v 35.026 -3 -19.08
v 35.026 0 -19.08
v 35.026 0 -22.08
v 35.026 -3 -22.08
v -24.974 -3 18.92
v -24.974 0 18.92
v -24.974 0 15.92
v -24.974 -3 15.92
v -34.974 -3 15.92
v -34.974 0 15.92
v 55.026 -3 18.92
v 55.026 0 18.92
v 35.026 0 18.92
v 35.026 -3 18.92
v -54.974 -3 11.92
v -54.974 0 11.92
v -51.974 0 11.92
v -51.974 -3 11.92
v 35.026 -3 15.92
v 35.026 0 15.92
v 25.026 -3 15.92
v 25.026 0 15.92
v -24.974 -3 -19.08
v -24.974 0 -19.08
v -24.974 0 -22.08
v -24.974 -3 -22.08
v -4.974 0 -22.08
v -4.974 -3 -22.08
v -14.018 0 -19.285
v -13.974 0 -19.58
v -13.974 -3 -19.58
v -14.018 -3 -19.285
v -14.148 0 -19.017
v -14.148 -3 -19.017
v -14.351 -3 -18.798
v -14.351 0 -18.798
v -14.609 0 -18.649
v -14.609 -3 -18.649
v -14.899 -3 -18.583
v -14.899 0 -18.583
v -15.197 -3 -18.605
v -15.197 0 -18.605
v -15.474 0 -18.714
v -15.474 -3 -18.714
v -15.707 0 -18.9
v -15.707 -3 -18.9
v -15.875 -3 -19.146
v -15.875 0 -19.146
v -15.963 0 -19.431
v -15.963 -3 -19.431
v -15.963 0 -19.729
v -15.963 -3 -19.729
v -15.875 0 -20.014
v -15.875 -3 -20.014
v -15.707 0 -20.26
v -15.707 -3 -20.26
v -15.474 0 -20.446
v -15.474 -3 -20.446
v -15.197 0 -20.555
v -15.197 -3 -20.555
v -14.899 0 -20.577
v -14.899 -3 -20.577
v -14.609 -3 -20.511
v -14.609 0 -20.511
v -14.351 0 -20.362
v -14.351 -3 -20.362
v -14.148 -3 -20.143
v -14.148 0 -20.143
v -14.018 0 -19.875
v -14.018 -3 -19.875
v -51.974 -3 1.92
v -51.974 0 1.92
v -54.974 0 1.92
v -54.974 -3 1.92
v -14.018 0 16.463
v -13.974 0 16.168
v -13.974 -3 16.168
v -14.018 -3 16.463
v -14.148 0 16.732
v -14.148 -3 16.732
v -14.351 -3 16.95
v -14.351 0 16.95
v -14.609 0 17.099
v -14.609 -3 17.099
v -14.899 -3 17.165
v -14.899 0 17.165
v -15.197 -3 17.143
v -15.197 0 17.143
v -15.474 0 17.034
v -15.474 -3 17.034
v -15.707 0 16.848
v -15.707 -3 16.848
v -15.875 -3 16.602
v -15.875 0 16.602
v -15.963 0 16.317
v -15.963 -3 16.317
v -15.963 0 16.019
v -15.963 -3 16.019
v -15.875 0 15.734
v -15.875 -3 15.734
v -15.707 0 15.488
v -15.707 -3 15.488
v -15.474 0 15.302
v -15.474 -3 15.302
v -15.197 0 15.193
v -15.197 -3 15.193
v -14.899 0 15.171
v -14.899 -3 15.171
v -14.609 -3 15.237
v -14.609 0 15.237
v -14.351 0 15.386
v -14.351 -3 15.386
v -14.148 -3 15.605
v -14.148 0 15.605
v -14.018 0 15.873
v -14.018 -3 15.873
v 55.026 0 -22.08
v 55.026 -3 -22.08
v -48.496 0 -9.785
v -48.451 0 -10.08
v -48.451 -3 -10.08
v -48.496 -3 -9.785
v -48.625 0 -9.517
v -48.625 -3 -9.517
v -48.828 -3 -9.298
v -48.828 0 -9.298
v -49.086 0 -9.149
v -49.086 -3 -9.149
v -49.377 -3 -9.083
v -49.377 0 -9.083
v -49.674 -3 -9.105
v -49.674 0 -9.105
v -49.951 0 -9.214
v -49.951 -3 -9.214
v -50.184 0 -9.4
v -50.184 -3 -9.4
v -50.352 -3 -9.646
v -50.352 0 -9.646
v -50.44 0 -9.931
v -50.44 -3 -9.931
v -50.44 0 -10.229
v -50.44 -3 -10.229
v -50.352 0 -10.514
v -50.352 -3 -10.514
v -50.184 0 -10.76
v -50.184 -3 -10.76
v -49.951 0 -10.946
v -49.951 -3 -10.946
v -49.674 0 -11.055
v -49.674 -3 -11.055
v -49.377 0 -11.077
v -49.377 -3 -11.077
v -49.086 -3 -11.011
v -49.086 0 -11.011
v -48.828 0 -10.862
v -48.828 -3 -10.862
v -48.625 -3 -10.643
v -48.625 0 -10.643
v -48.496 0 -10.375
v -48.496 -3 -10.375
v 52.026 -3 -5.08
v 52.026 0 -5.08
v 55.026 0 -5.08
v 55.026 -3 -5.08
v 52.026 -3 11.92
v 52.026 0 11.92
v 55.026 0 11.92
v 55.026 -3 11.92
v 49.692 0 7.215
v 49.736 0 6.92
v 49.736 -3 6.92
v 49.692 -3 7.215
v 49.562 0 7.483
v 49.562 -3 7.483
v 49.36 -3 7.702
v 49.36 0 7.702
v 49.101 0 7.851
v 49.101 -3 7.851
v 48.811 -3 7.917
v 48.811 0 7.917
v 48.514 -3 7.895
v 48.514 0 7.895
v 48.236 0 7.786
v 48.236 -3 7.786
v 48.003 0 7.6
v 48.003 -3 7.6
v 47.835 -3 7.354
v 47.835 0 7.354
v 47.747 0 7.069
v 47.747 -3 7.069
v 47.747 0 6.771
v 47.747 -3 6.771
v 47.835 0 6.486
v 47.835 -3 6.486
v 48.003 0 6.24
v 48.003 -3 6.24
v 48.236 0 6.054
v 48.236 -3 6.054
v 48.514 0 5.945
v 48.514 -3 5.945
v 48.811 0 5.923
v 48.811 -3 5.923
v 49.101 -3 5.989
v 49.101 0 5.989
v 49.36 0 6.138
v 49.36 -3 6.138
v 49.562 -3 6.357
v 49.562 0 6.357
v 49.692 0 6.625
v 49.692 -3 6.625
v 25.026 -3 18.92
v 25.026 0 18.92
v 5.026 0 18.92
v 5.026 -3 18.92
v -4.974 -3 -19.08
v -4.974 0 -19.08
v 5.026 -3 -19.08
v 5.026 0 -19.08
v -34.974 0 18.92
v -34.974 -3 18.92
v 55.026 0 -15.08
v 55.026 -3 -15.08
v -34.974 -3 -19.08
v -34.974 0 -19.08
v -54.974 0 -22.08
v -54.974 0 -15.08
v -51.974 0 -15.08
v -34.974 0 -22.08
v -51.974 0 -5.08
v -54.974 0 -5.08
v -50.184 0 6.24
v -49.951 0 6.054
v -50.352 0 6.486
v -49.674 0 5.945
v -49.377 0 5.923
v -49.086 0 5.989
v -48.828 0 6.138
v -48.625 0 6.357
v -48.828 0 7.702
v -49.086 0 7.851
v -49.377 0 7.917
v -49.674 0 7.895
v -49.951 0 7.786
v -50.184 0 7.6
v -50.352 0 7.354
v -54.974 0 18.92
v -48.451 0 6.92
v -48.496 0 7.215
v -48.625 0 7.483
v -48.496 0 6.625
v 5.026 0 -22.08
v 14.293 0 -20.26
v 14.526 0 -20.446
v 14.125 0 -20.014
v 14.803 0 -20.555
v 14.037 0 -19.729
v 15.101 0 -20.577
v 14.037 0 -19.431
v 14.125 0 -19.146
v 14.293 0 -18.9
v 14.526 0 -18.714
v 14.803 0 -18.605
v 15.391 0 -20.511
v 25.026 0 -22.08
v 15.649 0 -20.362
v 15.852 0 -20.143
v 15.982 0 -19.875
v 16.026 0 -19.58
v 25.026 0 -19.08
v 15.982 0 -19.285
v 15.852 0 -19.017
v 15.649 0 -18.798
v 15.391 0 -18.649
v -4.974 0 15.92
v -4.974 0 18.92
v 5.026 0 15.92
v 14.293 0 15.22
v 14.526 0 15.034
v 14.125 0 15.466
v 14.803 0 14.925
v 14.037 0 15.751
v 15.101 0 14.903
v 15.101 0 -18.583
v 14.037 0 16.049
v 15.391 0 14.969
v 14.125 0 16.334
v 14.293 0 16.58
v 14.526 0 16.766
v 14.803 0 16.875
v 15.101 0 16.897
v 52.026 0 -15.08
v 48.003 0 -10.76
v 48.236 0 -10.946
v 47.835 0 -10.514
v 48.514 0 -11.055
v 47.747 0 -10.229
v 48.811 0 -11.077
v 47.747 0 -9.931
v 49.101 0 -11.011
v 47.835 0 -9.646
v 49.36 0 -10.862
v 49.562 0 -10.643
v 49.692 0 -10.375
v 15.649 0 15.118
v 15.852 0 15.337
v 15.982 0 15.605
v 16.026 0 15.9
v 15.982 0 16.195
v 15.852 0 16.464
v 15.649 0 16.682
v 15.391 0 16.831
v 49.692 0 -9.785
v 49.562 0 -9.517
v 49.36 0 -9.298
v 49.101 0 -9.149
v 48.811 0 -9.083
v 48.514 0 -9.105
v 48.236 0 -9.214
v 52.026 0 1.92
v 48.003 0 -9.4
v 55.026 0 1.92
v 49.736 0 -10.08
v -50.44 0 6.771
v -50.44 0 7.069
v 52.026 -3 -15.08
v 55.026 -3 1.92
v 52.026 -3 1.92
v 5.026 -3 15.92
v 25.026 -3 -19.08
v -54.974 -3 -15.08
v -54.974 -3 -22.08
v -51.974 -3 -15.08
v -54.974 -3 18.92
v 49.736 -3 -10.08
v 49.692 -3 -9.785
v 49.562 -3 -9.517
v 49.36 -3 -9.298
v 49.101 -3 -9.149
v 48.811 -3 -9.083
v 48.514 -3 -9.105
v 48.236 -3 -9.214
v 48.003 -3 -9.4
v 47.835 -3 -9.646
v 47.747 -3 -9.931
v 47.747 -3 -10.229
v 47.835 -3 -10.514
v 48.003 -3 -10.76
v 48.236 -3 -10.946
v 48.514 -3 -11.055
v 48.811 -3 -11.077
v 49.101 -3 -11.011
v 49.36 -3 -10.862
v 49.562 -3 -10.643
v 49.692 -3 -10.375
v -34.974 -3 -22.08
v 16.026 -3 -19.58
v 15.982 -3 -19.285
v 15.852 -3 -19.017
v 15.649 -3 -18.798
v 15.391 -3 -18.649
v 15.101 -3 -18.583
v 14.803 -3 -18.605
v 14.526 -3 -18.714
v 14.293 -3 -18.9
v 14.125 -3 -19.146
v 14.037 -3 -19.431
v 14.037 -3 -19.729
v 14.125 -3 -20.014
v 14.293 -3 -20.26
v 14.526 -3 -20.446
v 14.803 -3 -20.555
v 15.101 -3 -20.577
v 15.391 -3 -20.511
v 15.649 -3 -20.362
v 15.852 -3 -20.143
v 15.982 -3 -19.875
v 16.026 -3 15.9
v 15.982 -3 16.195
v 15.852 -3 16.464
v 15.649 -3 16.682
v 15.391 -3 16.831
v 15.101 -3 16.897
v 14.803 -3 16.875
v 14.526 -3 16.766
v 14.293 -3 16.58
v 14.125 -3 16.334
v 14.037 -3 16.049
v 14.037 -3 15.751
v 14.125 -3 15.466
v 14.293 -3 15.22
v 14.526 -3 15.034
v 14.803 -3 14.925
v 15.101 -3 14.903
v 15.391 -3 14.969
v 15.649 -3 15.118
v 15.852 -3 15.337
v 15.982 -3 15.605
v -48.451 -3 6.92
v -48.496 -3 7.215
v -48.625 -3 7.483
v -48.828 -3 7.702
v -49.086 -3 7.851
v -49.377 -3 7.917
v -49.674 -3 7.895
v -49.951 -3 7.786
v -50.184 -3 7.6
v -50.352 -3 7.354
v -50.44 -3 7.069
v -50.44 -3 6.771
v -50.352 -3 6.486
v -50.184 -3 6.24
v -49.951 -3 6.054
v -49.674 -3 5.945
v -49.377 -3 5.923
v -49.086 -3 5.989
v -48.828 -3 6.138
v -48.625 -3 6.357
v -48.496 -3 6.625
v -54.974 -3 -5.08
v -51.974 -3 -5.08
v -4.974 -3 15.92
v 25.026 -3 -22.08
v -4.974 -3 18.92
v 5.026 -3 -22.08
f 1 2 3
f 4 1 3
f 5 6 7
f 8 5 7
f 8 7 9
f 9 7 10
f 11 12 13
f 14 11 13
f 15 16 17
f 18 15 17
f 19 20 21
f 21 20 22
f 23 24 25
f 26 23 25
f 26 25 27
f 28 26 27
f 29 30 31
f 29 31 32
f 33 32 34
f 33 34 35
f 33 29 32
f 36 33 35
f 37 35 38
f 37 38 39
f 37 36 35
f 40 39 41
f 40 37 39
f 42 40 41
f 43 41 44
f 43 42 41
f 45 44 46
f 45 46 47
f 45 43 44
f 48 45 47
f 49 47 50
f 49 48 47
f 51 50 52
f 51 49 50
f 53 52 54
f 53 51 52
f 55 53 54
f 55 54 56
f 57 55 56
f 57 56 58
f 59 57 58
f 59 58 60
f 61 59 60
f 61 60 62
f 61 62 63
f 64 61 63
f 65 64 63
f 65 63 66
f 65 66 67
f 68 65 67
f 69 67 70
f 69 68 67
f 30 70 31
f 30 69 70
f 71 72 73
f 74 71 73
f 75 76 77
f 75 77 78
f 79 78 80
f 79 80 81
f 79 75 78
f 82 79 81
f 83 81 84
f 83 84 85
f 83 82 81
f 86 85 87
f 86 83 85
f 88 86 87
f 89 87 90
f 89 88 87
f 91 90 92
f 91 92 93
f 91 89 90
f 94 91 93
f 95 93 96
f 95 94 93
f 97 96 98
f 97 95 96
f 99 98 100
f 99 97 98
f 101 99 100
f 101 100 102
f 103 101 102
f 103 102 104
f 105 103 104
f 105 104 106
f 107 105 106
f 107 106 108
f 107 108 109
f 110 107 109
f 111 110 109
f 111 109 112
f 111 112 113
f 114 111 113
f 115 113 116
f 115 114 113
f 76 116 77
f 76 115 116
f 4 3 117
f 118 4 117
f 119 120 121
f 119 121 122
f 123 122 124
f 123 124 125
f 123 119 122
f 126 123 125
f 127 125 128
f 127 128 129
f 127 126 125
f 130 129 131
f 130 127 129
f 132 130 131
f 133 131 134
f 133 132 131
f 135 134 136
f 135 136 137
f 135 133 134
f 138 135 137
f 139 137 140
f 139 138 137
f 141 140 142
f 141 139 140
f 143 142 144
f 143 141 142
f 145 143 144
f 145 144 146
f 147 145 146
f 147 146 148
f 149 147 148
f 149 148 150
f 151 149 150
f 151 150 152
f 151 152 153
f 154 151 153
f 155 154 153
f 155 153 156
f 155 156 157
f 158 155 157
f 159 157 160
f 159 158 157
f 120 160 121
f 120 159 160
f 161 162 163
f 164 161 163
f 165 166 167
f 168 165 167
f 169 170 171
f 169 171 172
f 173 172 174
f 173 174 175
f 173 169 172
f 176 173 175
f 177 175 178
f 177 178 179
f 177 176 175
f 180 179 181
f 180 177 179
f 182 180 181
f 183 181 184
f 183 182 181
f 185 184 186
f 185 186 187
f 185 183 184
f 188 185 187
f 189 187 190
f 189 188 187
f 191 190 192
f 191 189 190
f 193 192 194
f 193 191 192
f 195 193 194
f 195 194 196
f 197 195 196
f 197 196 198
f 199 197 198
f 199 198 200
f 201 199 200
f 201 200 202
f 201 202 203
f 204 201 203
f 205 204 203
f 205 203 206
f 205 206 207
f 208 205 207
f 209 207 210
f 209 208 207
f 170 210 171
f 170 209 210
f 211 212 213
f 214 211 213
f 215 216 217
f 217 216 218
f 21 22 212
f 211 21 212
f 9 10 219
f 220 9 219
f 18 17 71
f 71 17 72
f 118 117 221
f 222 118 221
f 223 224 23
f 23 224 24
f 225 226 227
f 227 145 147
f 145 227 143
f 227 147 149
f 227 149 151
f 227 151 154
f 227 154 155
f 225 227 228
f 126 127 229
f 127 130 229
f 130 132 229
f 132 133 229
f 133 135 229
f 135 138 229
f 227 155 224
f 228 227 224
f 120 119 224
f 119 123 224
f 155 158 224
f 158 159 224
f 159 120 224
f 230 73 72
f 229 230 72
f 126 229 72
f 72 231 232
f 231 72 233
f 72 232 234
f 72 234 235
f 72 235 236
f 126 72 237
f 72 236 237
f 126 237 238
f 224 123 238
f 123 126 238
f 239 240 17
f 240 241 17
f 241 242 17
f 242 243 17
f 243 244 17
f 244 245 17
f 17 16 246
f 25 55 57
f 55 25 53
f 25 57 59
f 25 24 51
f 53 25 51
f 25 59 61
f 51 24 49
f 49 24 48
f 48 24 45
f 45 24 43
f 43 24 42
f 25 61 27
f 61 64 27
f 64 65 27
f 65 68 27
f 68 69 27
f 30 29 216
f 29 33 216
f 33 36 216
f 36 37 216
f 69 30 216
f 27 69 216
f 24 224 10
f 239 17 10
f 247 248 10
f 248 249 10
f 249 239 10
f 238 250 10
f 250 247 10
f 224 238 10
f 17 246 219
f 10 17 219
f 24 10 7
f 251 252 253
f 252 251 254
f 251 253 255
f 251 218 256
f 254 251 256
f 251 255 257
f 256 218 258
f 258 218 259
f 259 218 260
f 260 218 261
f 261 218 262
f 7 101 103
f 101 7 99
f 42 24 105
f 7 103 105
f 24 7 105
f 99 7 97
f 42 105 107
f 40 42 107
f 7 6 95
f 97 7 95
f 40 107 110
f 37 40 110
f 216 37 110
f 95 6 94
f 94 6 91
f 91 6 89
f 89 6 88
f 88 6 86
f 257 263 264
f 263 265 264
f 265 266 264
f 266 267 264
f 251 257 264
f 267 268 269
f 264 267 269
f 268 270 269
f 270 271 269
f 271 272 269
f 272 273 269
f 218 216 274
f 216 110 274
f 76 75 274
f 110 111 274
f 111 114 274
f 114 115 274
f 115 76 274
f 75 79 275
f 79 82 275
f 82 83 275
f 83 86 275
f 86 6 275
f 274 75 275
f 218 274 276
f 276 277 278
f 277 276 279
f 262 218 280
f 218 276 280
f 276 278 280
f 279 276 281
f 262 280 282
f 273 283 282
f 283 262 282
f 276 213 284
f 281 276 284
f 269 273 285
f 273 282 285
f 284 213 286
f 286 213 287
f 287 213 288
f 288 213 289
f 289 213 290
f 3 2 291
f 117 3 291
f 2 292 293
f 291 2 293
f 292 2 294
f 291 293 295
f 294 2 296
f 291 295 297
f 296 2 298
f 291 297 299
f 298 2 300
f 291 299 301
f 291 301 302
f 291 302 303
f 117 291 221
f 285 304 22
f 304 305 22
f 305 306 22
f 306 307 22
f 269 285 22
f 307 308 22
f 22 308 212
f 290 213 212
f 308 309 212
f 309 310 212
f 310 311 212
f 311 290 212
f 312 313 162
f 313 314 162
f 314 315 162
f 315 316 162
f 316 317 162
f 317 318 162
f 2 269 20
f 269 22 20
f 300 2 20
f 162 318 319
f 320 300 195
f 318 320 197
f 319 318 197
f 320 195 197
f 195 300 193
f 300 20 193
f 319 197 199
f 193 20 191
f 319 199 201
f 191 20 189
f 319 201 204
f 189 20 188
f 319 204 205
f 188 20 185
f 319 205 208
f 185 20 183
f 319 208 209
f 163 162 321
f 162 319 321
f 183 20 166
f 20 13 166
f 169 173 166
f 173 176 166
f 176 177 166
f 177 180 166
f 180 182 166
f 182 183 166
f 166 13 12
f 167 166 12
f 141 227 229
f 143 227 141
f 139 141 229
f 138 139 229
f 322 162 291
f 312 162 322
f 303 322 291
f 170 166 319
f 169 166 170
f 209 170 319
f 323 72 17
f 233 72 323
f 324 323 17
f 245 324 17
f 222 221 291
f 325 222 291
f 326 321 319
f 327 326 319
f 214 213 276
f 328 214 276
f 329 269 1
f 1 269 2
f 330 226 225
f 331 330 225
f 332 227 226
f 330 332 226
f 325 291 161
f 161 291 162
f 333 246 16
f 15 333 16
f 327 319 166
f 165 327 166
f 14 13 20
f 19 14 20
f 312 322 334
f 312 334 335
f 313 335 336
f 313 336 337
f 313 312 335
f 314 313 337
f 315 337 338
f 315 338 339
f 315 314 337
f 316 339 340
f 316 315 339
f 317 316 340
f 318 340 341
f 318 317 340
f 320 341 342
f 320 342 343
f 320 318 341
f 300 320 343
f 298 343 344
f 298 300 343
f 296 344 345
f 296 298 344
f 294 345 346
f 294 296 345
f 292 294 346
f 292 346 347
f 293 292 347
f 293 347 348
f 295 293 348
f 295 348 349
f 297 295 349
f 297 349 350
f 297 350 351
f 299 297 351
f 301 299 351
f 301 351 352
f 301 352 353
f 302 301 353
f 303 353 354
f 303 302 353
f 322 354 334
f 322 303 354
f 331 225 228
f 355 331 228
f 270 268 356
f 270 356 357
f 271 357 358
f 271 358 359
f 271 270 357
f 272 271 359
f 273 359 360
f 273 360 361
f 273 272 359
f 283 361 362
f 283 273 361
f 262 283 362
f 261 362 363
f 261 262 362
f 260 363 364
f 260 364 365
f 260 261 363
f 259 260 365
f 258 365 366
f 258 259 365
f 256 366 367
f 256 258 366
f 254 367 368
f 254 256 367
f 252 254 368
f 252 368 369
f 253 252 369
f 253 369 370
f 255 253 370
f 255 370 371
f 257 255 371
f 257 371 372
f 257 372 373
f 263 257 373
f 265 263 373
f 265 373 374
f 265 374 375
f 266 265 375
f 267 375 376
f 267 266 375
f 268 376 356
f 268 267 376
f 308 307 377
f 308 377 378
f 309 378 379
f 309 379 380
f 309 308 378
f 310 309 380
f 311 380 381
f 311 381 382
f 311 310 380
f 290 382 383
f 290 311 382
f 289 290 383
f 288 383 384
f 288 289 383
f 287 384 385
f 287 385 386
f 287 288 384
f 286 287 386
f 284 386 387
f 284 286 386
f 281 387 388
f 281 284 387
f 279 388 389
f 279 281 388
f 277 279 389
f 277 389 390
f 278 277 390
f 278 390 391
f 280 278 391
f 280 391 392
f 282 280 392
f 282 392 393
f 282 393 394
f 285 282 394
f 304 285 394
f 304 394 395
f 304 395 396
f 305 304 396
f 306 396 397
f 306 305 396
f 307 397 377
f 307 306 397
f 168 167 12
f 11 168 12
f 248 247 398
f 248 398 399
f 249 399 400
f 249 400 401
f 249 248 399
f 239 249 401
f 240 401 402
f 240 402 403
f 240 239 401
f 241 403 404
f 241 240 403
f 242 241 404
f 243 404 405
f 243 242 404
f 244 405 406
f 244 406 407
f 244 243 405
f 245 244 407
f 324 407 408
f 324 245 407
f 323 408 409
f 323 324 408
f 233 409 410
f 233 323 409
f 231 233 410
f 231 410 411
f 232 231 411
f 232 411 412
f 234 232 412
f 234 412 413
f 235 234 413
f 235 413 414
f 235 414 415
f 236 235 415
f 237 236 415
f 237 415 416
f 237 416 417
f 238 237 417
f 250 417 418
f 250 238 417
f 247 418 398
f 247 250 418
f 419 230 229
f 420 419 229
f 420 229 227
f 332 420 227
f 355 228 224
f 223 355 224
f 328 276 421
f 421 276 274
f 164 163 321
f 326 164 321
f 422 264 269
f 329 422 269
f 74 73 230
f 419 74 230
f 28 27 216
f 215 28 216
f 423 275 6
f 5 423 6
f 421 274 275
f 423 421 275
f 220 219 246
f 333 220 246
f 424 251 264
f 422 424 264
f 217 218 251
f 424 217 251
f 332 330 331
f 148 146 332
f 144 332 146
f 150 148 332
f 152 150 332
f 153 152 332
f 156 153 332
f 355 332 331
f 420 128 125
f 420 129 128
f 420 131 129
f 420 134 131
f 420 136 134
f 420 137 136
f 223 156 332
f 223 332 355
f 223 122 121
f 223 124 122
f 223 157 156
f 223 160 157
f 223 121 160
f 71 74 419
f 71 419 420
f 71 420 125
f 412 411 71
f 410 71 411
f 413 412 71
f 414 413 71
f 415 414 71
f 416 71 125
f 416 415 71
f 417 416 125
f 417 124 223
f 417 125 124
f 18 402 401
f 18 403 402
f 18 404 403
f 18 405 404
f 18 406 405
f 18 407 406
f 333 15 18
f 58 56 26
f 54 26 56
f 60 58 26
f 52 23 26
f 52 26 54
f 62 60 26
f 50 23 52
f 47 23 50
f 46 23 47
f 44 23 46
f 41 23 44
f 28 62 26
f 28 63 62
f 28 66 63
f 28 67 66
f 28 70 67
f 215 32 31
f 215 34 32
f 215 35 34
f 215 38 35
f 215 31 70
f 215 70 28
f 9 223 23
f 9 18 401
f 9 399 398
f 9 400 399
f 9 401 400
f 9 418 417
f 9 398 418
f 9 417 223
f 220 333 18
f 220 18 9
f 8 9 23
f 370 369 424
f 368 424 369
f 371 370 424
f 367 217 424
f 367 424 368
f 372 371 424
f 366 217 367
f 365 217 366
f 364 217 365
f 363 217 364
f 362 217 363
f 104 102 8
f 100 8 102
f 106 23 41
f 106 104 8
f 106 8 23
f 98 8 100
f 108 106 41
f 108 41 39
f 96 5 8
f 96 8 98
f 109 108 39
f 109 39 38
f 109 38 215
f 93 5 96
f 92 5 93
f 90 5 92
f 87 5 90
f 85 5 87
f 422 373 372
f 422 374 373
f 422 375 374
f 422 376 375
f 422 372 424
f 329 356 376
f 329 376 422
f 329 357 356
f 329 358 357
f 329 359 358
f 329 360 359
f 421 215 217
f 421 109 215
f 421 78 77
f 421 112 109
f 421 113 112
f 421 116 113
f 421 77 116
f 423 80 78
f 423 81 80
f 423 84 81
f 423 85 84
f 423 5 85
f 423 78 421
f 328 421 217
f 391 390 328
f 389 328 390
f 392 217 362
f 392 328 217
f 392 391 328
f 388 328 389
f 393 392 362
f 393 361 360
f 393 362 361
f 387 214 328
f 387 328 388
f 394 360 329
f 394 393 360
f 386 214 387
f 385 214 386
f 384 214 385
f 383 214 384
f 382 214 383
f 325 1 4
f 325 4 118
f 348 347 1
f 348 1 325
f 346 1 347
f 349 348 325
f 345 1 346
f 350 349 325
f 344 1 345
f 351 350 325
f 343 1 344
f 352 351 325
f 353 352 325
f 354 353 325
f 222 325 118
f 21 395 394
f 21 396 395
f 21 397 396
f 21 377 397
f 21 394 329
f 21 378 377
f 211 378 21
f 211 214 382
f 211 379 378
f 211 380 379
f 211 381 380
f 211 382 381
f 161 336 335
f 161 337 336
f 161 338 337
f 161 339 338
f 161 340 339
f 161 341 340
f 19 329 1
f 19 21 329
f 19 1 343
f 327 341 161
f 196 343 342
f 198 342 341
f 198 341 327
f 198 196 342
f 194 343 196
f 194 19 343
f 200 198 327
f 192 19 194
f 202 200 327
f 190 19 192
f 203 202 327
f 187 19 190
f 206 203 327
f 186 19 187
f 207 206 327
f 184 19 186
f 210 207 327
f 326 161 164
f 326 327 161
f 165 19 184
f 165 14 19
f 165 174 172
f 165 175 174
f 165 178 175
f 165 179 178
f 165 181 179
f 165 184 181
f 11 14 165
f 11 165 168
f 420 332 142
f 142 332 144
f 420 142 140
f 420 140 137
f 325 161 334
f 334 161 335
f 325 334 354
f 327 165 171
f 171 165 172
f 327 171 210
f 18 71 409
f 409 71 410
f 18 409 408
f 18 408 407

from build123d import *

# Parameters (mm, degrees)
F0_R     = 1
F1_DEPTH = 3


with BuildPart() as f1:
    # F0 (on Front) → F1 (new body)
    with BuildSketch(Plane.XZ):
        Polygon((-51.973995, 1.919852), (-54.973995, 1.919852), (-54.973995, -1.580148), (-54.973995, -5.080148), (-51.973995, -5.080148), (-51.973995, -15.080148), (-54.973995, -15.080148), (-54.973995, -22.080148), (-34.973995, -22.080148), (-34.973995, -19.080148), (-24.973995, -19.080148), (-24.973995, -22.080148), (-4.973995, -22.080148), (-4.973995, -19.080148), (0.026005, -19.080148), (5.026005, -19.080148), (5.026005, -22.080148), (25.026005, -22.080148), (25.026005, -19.080148), (35.026005, -19.080148), (35.026005, -22.080148), (55.026005, -22.080148), (55.026005, -15.080148), (52.026005, -15.080148), (52.026005, -5.080148), (55.026005, -5.080148), (55.026005, -1.580148), (55.026005, 1.919852), (52.026005, 1.919852), (52.026005, 11.919852), (55.026005, 11.919852), (55.026005, 18.919852), (35.026005, 18.919852), (35.026005, 15.919852), (25.026005, 15.919852), (25.026005, 18.919852), (5.026005, 18.919852), (5.026005, 15.919852), (0.026005, 15.919852), (-4.973995, 15.919852), (-4.973995, 18.919852), (-24.973995, 18.919852), (-24.973995, 15.919852), (-34.973995, 15.919852), (-34.973995, 18.919852), (-54.973995, 18.919852), (-54.973995, 11.919852), (-51.973995, 11.919852), align=None)
        with Locations((-14.973995, -19.580148)):
            Circle(F0_R, mode=Mode.SUBTRACT)
        with Locations((-49.451287, -10.080148)):
            Circle(F0_R, mode=Mode.SUBTRACT)
        with Locations((15.026005, -19.580148)):
            Circle(F0_R, mode=Mode.SUBTRACT)
        with Locations((48.736135, -10.080148)):
            Circle(F0_R, mode=Mode.SUBTRACT)
        with Locations((-49.451287, 6.919852)):
            Circle(F0_R, mode=Mode.SUBTRACT)
        with Locations((-14.973995, 16.168253)):
            Circle(F0_R, mode=Mode.SUBTRACT)
        with Locations((48.736135, 6.919852)):
            Circle(F0_R, mode=Mode.SUBTRACT)
        with Locations((15.026005, 15.900204)):
            Circle(F0_R, mode=Mode.SUBTRACT)
    extrude(amount=F1_DEPTH)


solid = f1.part
